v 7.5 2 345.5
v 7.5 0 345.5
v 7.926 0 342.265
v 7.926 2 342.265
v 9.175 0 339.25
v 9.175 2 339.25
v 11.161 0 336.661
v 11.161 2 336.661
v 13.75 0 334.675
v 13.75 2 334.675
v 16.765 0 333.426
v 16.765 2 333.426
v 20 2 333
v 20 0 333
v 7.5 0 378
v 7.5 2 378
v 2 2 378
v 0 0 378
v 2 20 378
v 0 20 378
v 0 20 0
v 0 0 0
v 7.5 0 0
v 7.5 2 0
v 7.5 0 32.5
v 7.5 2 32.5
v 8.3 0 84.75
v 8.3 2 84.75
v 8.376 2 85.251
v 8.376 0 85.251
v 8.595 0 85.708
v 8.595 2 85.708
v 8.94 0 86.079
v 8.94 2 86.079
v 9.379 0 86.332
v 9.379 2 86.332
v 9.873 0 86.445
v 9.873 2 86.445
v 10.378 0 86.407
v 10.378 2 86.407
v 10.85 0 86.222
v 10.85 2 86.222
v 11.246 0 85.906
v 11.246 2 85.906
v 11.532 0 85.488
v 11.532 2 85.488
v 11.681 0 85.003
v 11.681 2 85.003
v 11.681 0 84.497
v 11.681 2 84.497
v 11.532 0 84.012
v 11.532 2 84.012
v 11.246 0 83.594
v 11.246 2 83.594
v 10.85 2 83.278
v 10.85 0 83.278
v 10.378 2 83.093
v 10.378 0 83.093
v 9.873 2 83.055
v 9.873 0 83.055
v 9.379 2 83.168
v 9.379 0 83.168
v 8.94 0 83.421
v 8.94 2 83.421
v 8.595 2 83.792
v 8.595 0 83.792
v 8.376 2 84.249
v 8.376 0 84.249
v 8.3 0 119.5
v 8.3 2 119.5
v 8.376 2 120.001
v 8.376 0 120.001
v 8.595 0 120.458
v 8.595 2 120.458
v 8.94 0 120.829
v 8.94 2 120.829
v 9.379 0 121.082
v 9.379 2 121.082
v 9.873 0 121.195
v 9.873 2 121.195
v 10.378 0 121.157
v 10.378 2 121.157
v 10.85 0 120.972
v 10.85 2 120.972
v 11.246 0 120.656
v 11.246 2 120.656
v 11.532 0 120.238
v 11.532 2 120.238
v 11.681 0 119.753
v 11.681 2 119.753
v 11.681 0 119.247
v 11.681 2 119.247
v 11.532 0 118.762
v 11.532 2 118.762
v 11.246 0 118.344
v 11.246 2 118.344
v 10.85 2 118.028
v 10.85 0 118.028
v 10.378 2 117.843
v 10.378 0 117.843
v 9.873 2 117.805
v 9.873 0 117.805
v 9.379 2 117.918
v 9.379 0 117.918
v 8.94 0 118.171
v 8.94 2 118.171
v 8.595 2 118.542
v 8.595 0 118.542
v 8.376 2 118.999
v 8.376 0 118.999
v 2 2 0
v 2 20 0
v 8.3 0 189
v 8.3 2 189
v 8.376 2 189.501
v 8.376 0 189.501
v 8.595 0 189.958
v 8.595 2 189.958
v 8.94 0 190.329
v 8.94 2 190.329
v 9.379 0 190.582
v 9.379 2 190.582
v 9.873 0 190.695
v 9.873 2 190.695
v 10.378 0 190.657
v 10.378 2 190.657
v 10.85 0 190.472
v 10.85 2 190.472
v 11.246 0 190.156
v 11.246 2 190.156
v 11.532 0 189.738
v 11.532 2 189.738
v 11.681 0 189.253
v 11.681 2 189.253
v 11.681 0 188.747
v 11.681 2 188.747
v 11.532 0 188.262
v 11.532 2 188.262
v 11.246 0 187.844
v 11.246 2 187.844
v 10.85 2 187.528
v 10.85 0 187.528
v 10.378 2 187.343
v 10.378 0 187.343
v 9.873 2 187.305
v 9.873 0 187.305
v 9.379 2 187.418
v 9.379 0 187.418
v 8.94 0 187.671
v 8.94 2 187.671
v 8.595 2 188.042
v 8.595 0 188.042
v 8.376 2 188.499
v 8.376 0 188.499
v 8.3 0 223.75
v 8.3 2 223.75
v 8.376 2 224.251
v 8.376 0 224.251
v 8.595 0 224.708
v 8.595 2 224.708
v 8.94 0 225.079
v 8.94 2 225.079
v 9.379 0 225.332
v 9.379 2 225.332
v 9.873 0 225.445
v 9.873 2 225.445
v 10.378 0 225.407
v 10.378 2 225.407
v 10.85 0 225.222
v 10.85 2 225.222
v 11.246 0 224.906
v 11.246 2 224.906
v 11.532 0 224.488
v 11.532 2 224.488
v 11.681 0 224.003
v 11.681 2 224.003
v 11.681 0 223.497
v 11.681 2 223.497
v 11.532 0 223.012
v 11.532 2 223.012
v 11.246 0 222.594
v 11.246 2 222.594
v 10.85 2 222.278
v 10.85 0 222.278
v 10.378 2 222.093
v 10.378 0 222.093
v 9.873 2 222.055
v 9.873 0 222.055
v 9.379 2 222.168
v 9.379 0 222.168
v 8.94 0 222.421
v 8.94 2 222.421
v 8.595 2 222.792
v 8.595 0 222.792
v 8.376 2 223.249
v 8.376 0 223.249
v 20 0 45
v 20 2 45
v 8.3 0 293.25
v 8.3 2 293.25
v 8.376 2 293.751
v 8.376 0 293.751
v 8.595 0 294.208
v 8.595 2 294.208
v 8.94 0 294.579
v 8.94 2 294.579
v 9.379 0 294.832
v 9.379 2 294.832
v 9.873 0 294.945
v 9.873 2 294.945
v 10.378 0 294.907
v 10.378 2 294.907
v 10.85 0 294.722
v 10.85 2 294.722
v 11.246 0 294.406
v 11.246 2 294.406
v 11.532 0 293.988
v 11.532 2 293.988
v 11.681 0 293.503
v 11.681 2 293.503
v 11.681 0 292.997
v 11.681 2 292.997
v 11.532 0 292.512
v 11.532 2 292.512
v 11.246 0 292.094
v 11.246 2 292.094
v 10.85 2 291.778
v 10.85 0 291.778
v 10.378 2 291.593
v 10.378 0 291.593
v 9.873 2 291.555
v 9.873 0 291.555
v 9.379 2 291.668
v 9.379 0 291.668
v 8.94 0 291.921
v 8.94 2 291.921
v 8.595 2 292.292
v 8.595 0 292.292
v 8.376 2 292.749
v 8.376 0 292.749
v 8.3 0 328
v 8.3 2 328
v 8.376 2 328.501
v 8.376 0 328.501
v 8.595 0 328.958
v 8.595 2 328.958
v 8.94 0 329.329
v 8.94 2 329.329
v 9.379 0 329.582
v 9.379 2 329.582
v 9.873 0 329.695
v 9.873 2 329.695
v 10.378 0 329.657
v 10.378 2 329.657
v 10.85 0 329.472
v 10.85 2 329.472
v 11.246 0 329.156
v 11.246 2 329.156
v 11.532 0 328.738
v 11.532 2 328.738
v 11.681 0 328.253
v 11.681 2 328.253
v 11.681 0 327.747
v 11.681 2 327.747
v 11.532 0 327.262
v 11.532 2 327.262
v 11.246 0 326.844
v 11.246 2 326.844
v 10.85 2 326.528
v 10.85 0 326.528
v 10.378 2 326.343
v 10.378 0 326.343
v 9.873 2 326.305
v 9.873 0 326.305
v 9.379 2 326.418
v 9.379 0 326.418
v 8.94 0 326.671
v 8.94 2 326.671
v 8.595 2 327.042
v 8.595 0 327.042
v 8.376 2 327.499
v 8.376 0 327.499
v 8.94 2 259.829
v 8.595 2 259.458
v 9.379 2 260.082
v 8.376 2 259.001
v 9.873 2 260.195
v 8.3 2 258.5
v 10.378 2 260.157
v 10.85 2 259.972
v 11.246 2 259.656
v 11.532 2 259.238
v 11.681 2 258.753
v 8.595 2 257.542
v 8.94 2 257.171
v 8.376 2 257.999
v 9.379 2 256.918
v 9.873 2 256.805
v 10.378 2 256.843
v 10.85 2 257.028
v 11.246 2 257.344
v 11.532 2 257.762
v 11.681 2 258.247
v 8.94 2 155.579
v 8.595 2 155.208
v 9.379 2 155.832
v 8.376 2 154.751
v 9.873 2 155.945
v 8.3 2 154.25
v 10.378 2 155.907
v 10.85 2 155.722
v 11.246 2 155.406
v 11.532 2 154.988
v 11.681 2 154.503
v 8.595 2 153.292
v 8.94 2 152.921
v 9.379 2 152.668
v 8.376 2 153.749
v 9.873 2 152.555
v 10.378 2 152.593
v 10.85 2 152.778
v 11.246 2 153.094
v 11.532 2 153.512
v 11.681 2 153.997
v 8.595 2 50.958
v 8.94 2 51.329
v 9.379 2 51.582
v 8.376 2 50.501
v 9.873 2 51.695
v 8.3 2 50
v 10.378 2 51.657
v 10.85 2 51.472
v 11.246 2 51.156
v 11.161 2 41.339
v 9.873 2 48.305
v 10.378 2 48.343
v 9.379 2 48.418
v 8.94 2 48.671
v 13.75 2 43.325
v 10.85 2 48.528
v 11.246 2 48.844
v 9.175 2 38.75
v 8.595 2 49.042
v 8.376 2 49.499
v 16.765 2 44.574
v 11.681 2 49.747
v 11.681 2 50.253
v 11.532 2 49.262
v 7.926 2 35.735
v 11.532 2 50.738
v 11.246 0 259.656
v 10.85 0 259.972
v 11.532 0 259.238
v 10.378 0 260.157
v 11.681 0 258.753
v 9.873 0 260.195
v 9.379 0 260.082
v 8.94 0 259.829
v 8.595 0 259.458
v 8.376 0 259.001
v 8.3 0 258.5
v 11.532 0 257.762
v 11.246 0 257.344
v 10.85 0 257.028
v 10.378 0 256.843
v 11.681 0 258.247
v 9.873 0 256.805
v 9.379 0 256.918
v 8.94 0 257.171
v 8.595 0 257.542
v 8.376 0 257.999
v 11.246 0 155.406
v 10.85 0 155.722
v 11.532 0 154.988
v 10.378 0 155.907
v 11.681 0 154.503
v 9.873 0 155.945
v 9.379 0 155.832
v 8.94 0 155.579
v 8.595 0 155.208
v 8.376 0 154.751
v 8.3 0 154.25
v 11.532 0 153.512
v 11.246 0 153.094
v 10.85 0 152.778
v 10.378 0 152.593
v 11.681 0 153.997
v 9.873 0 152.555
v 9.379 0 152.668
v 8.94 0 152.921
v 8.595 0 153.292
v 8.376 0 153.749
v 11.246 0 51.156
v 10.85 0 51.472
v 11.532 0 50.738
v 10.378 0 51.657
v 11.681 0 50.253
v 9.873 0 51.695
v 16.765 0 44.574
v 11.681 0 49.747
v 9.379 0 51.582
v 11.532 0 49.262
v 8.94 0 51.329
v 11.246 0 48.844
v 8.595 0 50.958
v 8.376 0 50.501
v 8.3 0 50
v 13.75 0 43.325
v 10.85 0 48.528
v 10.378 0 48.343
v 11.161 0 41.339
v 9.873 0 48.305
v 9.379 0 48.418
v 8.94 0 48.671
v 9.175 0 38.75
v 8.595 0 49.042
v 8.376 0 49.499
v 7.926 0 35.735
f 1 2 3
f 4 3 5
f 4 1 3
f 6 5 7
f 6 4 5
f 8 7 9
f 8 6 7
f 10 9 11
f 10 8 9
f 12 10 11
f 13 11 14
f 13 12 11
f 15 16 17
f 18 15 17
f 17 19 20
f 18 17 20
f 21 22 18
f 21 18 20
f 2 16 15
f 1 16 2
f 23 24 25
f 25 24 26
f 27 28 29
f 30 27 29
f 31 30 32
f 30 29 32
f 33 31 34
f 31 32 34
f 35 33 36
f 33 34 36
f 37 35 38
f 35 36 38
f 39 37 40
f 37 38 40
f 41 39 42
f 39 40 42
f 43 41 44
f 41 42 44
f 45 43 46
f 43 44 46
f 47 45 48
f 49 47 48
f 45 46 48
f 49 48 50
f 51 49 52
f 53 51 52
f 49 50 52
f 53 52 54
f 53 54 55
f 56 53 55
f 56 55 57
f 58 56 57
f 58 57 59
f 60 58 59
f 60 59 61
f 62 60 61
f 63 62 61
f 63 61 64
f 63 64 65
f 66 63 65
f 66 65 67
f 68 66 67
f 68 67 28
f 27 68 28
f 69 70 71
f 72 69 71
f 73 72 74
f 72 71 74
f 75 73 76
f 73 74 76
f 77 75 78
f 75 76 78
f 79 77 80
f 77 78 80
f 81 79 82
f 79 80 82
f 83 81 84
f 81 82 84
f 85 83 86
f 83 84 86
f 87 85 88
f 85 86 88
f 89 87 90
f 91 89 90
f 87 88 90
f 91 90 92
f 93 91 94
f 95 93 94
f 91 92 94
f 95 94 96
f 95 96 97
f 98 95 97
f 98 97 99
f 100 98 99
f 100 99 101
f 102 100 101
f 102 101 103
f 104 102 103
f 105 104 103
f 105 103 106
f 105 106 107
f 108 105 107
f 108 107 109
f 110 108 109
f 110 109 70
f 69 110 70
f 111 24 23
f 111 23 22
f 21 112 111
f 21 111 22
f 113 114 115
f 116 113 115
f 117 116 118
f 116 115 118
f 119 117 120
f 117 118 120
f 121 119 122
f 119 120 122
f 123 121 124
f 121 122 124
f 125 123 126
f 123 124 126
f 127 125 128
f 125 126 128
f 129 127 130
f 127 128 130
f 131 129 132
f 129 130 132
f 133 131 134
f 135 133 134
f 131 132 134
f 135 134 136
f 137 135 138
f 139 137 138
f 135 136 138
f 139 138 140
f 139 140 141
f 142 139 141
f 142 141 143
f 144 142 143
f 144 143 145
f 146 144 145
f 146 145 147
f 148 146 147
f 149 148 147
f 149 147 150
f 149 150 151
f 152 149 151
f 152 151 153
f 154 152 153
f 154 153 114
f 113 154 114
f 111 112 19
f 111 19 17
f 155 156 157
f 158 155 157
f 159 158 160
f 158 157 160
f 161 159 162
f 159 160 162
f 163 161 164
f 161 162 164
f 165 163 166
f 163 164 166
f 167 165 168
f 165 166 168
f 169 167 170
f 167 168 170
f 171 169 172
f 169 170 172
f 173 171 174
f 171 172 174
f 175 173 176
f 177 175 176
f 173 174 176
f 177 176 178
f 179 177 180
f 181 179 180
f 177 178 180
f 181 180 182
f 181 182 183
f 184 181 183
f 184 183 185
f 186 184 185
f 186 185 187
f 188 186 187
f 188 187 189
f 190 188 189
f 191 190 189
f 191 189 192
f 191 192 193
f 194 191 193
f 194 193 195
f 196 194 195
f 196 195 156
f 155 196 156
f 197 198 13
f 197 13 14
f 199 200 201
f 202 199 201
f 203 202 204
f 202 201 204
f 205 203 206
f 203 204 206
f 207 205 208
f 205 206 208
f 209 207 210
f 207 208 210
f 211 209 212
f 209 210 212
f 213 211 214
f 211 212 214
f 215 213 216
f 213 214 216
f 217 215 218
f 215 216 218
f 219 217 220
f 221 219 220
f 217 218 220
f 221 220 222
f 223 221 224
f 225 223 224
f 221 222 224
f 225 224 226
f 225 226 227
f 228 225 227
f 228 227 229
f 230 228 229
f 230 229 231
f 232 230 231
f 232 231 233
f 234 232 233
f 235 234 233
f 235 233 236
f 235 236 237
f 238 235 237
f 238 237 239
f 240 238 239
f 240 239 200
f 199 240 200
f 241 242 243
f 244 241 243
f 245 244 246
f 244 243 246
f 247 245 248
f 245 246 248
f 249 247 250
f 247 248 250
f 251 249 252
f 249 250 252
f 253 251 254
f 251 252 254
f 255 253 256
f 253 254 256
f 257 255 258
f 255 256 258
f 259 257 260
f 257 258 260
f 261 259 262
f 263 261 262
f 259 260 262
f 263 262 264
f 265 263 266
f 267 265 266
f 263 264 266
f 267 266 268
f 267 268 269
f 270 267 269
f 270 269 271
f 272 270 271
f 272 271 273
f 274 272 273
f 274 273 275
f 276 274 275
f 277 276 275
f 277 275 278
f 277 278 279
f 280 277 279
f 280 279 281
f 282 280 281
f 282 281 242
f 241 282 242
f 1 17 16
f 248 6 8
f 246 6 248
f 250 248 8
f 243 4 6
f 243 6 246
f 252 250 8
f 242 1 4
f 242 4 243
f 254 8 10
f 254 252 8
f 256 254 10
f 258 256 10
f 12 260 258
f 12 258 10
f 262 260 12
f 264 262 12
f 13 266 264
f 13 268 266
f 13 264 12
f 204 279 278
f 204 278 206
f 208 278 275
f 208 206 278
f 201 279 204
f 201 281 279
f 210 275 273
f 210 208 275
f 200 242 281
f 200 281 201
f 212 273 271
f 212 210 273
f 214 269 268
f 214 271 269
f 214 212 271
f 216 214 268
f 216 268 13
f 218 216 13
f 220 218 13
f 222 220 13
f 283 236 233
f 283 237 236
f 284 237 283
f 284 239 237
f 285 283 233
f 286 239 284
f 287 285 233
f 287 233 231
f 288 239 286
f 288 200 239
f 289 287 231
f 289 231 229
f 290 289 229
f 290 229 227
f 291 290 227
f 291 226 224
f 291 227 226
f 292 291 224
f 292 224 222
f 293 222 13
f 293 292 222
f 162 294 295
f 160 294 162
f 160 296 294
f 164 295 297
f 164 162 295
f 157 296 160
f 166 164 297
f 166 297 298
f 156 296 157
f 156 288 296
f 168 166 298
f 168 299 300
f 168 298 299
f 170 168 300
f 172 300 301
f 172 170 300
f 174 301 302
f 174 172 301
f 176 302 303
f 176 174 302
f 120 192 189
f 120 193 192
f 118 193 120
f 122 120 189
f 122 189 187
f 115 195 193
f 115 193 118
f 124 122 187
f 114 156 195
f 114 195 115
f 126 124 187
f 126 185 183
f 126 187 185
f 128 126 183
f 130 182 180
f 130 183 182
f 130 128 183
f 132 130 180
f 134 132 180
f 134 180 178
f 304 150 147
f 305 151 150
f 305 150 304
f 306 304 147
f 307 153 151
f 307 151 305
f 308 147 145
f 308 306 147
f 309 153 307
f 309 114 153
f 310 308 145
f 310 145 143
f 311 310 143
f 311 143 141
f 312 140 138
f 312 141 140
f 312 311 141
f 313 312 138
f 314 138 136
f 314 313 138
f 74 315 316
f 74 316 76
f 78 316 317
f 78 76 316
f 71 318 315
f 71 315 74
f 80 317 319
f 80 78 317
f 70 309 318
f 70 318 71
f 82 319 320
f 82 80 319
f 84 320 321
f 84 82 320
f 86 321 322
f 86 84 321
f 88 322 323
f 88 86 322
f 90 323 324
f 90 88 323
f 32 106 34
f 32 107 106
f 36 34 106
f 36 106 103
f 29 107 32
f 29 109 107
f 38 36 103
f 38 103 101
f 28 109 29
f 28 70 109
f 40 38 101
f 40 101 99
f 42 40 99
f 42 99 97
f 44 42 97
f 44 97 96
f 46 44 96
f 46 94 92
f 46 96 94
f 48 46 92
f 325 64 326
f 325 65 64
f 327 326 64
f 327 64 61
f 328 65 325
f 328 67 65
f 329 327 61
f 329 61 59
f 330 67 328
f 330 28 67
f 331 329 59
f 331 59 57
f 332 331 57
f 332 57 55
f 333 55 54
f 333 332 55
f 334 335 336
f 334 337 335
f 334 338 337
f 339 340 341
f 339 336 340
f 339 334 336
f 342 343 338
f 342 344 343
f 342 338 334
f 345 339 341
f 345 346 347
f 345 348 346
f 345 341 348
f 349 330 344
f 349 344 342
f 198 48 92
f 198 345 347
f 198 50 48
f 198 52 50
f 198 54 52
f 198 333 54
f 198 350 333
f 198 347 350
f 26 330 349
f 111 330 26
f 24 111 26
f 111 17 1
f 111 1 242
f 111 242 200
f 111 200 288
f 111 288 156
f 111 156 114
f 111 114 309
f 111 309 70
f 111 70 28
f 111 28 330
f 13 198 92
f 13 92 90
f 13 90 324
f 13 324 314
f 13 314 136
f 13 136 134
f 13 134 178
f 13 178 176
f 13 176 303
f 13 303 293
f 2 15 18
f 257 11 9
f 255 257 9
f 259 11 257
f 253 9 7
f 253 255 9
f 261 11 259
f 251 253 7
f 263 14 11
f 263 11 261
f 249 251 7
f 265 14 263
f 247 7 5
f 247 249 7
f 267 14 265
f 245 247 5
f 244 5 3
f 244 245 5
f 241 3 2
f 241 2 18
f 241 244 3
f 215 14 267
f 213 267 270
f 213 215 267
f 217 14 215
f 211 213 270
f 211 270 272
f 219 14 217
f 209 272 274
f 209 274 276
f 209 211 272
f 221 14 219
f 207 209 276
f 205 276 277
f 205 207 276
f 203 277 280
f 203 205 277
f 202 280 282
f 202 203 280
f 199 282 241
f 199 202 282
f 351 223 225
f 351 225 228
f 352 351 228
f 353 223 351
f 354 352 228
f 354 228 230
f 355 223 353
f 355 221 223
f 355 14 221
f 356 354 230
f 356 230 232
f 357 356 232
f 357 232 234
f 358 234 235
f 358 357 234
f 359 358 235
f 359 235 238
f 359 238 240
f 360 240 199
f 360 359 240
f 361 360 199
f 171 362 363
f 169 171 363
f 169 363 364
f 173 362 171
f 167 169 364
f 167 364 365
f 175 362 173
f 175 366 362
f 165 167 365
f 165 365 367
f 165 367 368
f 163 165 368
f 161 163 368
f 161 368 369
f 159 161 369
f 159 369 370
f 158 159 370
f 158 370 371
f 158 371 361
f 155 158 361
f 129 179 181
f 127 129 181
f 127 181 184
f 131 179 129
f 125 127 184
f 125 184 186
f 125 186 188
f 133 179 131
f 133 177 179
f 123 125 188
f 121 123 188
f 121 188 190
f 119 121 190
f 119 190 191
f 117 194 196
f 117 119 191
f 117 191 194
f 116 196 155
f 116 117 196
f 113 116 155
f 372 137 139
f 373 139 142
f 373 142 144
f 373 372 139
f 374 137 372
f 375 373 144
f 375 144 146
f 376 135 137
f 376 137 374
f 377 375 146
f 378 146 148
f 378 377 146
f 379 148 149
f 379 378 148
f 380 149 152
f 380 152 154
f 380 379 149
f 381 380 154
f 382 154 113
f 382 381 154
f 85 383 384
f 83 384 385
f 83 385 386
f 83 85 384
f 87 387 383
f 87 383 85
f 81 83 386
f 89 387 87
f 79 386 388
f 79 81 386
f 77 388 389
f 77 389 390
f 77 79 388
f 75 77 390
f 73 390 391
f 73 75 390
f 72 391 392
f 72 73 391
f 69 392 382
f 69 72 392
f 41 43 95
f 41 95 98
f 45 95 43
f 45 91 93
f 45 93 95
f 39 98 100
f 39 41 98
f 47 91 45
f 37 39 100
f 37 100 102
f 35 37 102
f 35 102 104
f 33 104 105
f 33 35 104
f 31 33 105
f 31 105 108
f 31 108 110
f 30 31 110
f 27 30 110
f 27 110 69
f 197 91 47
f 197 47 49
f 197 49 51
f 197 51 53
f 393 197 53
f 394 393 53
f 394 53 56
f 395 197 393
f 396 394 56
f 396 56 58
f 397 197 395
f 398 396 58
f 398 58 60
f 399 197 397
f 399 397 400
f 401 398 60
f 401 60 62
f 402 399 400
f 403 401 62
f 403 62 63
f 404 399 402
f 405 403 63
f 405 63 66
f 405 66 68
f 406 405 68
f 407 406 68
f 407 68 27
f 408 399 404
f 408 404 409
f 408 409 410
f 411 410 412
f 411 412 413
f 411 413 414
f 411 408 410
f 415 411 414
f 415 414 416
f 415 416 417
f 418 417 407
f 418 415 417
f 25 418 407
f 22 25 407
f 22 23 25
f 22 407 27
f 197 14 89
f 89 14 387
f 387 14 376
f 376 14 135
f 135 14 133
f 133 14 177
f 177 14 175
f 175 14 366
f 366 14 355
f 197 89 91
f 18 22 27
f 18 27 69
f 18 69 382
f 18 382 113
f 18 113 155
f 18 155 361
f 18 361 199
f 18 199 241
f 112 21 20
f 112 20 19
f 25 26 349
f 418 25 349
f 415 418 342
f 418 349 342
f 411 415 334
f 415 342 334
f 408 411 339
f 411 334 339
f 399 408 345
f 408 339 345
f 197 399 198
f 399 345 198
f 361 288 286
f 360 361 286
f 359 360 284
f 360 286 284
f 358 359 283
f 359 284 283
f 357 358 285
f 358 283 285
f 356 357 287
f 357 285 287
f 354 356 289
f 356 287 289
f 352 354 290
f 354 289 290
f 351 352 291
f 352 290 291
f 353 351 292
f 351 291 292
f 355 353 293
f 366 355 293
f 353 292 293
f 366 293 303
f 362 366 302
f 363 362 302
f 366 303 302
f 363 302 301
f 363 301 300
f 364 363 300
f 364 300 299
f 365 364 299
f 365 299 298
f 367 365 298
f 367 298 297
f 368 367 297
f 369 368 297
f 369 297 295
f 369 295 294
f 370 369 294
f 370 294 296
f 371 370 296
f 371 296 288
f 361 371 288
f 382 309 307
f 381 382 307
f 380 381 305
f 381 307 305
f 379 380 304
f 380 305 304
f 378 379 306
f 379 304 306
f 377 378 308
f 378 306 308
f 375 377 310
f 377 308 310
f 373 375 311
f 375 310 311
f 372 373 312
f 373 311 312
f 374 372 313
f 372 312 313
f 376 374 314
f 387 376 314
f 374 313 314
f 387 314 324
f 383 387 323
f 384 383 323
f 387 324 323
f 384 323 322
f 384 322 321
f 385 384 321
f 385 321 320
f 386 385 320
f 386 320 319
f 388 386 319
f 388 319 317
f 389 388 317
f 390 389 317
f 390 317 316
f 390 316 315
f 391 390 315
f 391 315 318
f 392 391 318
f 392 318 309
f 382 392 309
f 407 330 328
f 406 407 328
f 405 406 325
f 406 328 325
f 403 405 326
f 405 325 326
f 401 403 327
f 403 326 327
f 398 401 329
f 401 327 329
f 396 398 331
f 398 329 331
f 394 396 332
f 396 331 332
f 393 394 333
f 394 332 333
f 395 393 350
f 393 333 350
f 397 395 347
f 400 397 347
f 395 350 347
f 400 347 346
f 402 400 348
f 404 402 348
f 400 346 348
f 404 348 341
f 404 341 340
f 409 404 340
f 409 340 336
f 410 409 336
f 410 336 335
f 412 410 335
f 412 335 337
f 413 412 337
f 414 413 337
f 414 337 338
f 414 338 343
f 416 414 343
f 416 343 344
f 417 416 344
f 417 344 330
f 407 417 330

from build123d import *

# Parameters (mm, degrees)
EXTRUDE_1_DEPTH       = 378
CUT_EXTRUDE_1_DEPTH   = 379.956461879
HOLE_WIZARD_M31_D     = 3.4
HOLE_WIZARD_M31_DEPTH = 5
HOLE_WIZARD_M31_TIP   = 1.021463052


with BuildPart() as part:
    # Эскиз1 → Вытянуть-Тонкостенный1 (new body)
    with BuildSketch(Plane.XY):
        Polygon((20, 0), (0, 0), (0, 20), (2, 20), (2, 2), (20, 2), align=None)
    extrude(amount=EXTRUDE_1_DEPTH)

    # Эскиз2 → Вырез-Вытянуть1 (cut, through all)
    with BuildSketch(Plane(origin=(0, 2, 0), x_dir=(1, 0, 0), z_dir=(0, 1, 0))):
        with BuildLine():
            Line((7.5, -378), (7.5, -345.5))
            ThreePointArc((7.5, -345.5), (11.161165235, -336.661165235), (20, -333))
            Line((20, -333), (20, -378))
            Line((20, -378), (7.5, -378))
        make_face()
        with BuildLine():
            Line((20, 0), (7.5, 0))
            Line((7.5, 0), (7.5, -32.5))
            ThreePointArc((7.5, -32.5), (11.161165235, -41.338834765), (20, -45))
            Line((20, -45), (20, 0))
        make_face()
    extrude(amount=-CUT_EXTRUDE_1_DEPTH, mode=Mode.SUBTRACT)

    # Отверстие с зазором M31
    with Locations(Plane.XZ):
        with Locations((10, 50), (10, 84.75), (10, 119.5), (10, 154.25), (10, 189), (10, 223.75), (10, 258.5), (10, 293.25), (10, 328)):
            Hole(HOLE_WIZARD_M31_D / 2, depth=HOLE_WIZARD_M31_DEPTH)
            with Locations((0, 0, -(HOLE_WIZARD_M31_DEPTH + HOLE_WIZARD_M31_TIP / 2))):  # 118° drill point
                Cone(0, HOLE_WIZARD_M31_D / 2, HOLE_WIZARD_M31_TIP, mode=Mode.SUBTRACT)


solid = part.part
